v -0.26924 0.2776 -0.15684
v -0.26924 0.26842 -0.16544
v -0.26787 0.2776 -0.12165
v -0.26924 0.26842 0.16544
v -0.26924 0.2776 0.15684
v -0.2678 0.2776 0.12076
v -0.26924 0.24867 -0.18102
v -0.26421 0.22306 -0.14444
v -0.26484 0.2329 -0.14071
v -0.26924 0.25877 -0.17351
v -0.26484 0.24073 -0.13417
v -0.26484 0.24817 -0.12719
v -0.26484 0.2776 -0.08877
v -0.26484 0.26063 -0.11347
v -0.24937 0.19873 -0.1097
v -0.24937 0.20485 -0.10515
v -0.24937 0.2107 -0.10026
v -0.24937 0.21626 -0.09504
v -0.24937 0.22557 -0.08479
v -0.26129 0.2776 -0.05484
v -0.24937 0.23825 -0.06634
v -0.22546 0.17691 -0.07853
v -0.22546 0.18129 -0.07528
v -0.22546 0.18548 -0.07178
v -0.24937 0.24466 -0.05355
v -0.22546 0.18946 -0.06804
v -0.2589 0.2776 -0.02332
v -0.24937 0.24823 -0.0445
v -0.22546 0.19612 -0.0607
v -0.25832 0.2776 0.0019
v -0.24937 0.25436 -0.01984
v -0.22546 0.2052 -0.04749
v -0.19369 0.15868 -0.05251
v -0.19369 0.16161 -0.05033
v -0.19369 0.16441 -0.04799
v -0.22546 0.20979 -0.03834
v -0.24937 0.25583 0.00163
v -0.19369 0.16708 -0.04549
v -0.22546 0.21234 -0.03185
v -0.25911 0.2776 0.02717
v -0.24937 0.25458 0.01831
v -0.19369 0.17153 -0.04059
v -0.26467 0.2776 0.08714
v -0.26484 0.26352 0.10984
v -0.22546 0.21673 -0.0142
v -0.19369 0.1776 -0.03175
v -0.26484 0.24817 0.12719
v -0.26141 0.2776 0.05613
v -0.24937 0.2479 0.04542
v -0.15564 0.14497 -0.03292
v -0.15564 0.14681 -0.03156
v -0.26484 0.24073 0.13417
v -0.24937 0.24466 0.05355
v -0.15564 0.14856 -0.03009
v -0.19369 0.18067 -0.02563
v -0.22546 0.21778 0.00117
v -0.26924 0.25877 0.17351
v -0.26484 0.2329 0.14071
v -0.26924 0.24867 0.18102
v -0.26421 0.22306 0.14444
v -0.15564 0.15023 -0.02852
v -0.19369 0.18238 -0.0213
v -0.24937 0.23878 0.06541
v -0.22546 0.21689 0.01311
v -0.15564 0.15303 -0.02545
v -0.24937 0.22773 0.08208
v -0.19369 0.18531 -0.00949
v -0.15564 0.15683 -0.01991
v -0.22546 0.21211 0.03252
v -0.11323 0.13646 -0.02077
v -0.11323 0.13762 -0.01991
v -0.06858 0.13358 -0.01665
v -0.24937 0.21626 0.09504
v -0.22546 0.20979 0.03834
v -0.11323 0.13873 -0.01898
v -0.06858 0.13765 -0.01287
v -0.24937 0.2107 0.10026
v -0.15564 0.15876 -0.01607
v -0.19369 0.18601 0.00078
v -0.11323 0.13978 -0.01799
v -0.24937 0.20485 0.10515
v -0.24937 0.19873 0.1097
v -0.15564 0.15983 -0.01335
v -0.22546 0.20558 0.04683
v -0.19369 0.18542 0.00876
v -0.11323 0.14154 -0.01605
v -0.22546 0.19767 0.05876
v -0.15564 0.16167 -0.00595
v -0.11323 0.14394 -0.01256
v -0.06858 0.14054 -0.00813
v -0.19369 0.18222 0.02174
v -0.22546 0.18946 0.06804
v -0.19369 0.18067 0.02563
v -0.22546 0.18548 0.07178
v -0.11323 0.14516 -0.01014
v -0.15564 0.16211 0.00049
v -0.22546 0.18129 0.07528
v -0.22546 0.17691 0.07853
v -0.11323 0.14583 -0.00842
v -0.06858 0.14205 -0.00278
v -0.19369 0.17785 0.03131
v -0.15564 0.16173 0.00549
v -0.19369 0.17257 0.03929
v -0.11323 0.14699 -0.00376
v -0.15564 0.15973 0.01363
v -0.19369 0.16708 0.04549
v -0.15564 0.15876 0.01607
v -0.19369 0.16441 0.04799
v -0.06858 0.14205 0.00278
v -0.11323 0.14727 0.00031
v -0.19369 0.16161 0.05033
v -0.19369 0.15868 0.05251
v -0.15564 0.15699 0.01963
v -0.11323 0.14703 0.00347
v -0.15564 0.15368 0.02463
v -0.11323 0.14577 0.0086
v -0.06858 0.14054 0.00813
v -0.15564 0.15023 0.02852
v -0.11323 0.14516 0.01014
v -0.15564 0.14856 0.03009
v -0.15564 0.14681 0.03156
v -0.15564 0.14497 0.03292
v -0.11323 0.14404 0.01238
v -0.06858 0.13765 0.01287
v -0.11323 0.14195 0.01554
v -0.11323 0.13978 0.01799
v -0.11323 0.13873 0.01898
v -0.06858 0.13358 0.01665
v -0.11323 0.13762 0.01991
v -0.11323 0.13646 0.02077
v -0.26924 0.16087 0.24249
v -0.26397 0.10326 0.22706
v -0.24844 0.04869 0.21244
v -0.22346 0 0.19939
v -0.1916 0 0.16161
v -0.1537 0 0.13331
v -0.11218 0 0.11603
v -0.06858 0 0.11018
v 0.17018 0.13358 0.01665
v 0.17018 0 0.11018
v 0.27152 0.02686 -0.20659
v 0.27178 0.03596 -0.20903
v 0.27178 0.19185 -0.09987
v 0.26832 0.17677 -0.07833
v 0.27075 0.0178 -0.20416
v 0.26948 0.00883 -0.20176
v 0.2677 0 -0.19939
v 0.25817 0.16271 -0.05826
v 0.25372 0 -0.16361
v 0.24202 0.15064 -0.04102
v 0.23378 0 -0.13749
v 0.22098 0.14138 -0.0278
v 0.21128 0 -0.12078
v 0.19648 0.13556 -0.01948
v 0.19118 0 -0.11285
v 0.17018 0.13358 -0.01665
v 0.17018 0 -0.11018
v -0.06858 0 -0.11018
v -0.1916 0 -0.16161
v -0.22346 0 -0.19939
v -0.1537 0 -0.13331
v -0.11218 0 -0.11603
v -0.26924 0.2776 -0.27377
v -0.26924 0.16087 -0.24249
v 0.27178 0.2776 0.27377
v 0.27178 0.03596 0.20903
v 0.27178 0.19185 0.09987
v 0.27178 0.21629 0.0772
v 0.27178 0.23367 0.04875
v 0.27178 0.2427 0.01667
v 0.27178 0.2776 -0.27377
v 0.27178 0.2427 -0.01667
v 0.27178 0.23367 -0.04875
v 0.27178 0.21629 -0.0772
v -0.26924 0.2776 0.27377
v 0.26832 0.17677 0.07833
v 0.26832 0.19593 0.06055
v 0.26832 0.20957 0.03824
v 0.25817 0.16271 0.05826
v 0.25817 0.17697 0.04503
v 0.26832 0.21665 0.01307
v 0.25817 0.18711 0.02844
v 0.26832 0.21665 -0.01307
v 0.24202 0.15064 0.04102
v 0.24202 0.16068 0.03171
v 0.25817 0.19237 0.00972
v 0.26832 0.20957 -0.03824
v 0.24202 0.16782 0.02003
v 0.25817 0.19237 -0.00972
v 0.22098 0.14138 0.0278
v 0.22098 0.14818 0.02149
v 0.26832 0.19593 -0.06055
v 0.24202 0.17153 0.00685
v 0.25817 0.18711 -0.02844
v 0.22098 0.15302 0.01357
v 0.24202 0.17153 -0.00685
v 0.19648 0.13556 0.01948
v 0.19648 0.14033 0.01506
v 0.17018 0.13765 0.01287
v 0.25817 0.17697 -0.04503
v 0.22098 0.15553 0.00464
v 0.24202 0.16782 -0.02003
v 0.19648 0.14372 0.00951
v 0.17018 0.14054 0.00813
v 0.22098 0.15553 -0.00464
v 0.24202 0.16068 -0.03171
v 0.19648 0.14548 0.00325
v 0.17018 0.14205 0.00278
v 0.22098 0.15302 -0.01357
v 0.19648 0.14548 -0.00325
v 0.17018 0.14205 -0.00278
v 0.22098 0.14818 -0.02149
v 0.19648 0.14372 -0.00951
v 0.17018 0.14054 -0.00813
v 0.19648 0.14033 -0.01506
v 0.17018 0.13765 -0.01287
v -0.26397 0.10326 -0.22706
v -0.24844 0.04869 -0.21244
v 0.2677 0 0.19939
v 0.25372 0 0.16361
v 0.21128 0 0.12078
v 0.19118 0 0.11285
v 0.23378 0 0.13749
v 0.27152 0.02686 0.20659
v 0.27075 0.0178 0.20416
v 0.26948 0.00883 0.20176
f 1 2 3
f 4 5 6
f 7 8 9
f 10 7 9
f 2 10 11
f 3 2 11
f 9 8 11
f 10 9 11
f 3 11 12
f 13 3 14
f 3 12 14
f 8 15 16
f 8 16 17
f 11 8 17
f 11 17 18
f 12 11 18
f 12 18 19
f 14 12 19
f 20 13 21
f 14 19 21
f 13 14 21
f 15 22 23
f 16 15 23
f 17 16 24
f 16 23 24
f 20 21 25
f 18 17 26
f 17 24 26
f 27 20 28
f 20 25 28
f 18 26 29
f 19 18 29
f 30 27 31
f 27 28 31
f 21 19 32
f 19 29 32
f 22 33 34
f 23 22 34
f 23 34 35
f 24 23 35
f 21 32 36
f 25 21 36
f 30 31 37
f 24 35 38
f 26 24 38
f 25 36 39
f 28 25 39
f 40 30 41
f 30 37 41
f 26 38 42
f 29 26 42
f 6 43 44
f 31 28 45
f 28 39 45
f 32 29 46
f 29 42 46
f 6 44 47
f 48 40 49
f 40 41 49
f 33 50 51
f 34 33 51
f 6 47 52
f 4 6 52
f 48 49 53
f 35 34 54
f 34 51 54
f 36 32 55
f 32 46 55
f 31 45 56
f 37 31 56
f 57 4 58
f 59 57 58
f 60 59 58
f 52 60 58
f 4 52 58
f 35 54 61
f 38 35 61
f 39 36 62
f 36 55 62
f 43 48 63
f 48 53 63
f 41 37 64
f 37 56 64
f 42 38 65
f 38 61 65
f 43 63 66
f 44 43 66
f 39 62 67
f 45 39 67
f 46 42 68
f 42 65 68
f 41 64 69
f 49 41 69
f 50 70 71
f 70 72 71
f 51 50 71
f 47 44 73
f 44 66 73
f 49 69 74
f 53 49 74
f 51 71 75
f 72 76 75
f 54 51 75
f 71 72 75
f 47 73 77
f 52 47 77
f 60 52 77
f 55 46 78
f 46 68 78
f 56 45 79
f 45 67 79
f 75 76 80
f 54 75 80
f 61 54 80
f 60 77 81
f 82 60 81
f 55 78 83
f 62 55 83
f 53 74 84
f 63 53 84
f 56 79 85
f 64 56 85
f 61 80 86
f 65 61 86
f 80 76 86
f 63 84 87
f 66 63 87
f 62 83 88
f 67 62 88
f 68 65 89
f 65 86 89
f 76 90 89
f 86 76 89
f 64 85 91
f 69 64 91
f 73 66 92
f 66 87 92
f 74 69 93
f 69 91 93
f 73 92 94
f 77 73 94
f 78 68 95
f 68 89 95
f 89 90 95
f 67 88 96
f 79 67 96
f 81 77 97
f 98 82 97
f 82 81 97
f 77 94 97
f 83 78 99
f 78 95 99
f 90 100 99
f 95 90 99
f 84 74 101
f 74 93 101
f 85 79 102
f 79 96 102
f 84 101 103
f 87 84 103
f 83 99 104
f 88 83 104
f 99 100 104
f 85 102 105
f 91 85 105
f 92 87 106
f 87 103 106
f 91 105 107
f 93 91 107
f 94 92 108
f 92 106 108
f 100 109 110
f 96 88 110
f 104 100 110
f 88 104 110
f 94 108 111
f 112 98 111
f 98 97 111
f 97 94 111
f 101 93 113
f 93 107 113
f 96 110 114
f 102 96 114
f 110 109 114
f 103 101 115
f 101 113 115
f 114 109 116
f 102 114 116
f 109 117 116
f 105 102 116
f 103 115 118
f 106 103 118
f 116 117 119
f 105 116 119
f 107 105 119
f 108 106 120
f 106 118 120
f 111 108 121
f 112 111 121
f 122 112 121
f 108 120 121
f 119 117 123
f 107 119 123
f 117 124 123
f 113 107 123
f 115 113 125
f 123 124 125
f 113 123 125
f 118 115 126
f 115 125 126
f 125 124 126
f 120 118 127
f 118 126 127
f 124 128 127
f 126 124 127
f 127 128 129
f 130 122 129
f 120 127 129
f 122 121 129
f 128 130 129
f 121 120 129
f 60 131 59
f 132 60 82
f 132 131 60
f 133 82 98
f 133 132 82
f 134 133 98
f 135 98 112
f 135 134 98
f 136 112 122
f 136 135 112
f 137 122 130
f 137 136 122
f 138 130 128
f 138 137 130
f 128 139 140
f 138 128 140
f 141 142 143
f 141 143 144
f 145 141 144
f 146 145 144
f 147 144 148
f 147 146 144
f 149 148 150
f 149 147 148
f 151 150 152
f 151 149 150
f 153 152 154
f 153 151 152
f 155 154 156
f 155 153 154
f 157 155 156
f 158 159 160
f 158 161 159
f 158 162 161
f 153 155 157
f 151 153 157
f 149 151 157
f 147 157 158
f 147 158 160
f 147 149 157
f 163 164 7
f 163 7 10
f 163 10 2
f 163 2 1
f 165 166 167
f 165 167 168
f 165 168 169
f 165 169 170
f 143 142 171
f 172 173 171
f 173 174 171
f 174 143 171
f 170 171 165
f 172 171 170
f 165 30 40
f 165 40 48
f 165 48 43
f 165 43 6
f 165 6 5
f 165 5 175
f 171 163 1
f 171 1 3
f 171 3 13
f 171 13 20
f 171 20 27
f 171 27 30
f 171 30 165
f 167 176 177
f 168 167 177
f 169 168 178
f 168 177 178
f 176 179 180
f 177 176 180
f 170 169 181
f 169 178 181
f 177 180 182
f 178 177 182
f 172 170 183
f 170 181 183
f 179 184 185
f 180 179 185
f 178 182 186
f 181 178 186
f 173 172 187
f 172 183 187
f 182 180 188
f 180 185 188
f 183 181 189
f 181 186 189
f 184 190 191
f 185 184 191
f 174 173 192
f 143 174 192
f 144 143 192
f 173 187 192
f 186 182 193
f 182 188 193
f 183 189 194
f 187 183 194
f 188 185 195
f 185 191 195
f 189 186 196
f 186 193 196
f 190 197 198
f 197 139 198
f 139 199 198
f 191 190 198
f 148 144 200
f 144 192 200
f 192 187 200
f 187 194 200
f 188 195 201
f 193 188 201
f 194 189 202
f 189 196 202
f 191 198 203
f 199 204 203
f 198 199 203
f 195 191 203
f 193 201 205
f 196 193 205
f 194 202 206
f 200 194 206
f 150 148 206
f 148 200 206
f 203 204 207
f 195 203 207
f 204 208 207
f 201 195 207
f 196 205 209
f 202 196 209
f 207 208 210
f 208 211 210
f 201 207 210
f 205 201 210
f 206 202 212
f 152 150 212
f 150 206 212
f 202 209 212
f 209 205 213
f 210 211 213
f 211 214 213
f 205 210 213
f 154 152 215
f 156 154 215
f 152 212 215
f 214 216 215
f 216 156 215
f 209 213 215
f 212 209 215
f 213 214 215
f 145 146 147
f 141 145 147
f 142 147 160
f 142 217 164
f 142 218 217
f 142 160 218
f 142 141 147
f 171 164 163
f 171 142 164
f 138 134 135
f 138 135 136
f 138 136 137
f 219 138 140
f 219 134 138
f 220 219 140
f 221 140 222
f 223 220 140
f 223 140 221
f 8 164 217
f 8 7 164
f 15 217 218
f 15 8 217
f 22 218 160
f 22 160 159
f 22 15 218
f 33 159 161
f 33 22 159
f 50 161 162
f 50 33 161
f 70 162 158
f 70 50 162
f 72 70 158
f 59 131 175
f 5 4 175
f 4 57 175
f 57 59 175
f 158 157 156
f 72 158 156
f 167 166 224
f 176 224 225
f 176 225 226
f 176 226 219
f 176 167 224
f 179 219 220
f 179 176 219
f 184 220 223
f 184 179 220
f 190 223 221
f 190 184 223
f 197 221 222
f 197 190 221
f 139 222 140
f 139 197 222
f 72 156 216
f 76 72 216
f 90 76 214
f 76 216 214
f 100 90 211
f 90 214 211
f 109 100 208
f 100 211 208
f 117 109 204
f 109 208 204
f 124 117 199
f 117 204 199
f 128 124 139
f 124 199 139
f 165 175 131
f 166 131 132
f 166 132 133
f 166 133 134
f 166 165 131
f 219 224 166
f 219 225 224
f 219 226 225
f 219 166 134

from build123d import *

# Parameters (mm, degrees)
SKETCH_TL_CUTTING_R    = 1.4986
TL_CUTTING_DEPTH       = 75.9968
SKETCH_TDF_CUTTING_W   = 3.01719996
SKETCH_TDF_CUTTING_H   = 3.01719996
TDF_CUTTING_DEPTH      = 77.026345527
VW_VR_GRINDING_DEPTH   = 1.50859998
VW_VR_GRINDING_2_DEPTH = 1.50859998
ISA_GRINDING_DEPTH     = 1.50859998
SKETCH_PRE_FRX_BRX_W   = 1.21682002
SKETCH_PRE_FRX_BRX_H   = 0.83312
SKETCH_PRE_FRX_BRX_W_2 = 1.24935996
PRE_FRX_BRX_DEPTH      = 1.50859998
FA_BA_GRINDING_DEPTH   = 1.50859998
BR_EDM_R               = 0.20066
FR_EDM_R               = 0.1016
SKETCH_ENGRAVING_W     = 0.033186299
SKETCH_ENGRAVING_H     = 1.128593452
SKETCH_ENGRAVING_H_2   = 1.128593453
ENGRAVING_DEPTH        = 0.005


with BuildPart() as part:
    # sketch_TL_cutting → TL_cutting (new body)
    with BuildSketch(Plane(origin=(0, 0, 0), x_dir=(1, 0, 0), z_dir=(0, 1, 0))):
        with Locations(Location((0, 0, 0), (0, 0, 270))):
            Circle(SKETCH_TL_CUTTING_R)
    extrude(amount=TL_CUTTING_DEPTH)

    # sketch_TDF_cutting → TDF_cutting (cut, through all)
    with BuildSketch(Plane(origin=(0, 0, 0), x_dir=(1, 0, 0), z_dir=(0, 1, 0))):
        with Locations((-2.71001998, 0)):
            Rectangle(SKETCH_TDF_CUTTING_W, SKETCH_TDF_CUTTING_H)
    extrude(amount=TDF_CUTTING_DEPTH, mode=Mode.SUBTRACT)


with BuildPart() as body_2:
    # sketch_VW_VR_grinding → VW_VR_grinding (new, symmetric)
    with BuildSketch(Plane(origin=(0, 0, 0), x_dir=(0, 0, -1), z_dir=(1, 0, 0))):
        with BuildLine():
            Line((-1.49360001, -0.00999998), (-1.49360001, 0.822008914))
            ThreePointArc((-1.49360001, 0.822008914), (-1.493648337, 0.823115792), (-1.493792952, 0.824214246))
            Line((-1.493792952, 0.824214246), (-1.51859996, 0.964901782))
            Line((-1.51859996, 0.964901782), (-1.50859998, -0.00999998))
            Line((-1.50859998, -0.00999998), (-1.49360001, -0.00999998))
        make_face()
    extrude(amount=VW_VR_GRINDING_DEPTH, both=True)


with BuildPart() as body_3:
    # sketch_VW_VR_grinding → VW_VR_grinding 2 (new, symmetric)
    with BuildSketch(Plane(origin=(0, 0, 0), x_dir=(0, 0, -1), z_dir=(1, 0, 0))):
        with BuildLine():
            Line((1.49360001, -0.00999998), (1.49360001, 0.822008914))
            ThreePointArc((1.49360001, 0.822008914), (1.493648337, 0.823115792), (1.493792952, 0.824214246))
            Line((1.493792952, 0.824214246), (1.51859996, 0.964901782))
            Line((1.51859996, 0.964901782), (1.50859998, -0.00999998))
            Line((1.50859998, -0.00999998), (1.49360001, -0.00999998))
        make_face()
    extrude(amount=VW_VR_GRINDING_2_DEPTH, both=True)


    add(body_2.part)  # ISA_grinding merges body 2
    # sketch_ISA_grinding → ISA_grinding (add, symmetric)
    with BuildSketch(Plane(origin=(0, 0, 0), x_dir=(0, 0, -1), z_dir=(1, 0, 0))):
        Polygon((-0.19939, 0), (0.19939, 0), (1.50859998, 4.886038163), (1.50859998, -0.02999994), (-1.50859998, -0.02999994), (-1.50859998, 4.886038163), align=None)
    extrude(amount=ISA_GRINDING_DEPTH, both=True)

    # sketch_pre_FRX_BRX → pre_FRX_BRX (add, symmetric)
    with BuildSketch(Plane.XY):
        with Locations((0.89018999, 0.40656002)):
            Rectangle(SKETCH_PRE_FRX_BRX_W, SKETCH_PRE_FRX_BRX_H)
        with Locations((-0.89391998, 0.40656002)):
            Rectangle(SKETCH_PRE_FRX_BRX_W_2, SKETCH_PRE_FRX_BRX_H)
    extrude(amount=PRE_FRX_BRX_DEPTH, both=True)

    # sketch_FA_BA_grinding → FA_BA_grinding (add, symmetric)
    with BuildSketch(Plane.XY):
        Polygon((0.27178, -0.00999998), (0.27178, 0.83312), (1.6256, 10.466049838), (1.6256, -0.00999998), align=None)
        Polygon((-0.26924, -0.00999998), (-0.26924, 0.83312), (-1.32842, 8.369577303), (-1.32842, -0.00999998), align=None)
    extrude(amount=FA_BA_GRINDING_DEPTH, both=True)


with BuildPart() as part_1:
    add(part.part)

    # B1_fix: cut body 3
    add(body_3.part, mode=Mode.SUBTRACT)

    # V-Groove_EDM: sweep along a path in sketch_contour_V-Groove
    with BuildLine(Plane.XY) as v_groove_edm_path:
        Line((-1.20142, 0.14224), (1.4986, 0.14224))
    # sketch_section_V-Groove → V-Groove_EDM (sweep, cut)
    with BuildSketch(Plane(origin=(-1.20142, 0, -1.2954), x_dir=(0, 0, -1), z_dir=(1, 0, 0))):
        with BuildLine():
            Line((-1.27875483, 0.133575073), (-1.178222496, -0.00999998))
            Line((-1.178222496, -0.00999998), (-1.412577504, -0.00999998))
            Line((-1.412577504, -0.00999998), (-1.31204517, 0.133575073))
            ThreePointArc((-1.31204517, 0.133575073), (-1.2954, 0.14224), (-1.27875483, 0.133575073))
        make_face()
    sweep(path=v_groove_edm_path.line, mode=Mode.SUBTRACT)

    # BR_EDM
    br_edm_edges = [part_1.edges().sort_by_distance(p)[0] for p in [
        (-0.26924, 0.14224, 0),
        (-0.26924, 0.066787537, -0.063410306),
        (-0.26924, 0.066787537, 0.063410306),
    ]]
    fillet(br_edm_edges, radius=BR_EDM_R)

    # FR_EDM
    fr_edm_edges = [part_1.edges().sort_by_distance(p)[0] for p in [
        (0.27178, 0.066787537, -0.063410306),
        (0.27178, 0.066787537, 0.063410306),
        (0.27178, 0.14224, 0),
    ]]
    fillet(fr_edm_edges, radius=FR_EDM_R)

    # sketch_Engraving → Engraving (cut)
    # profile 1 of 14: a face of its own
    with BuildSketch(Plane.ZY.offset(1.20142)):
        Polygon((0.531688452, 45.269846756), (0.531688452, 44.551415224), (0.030264207, 44.92787231), (0.030264207, 44.765052028), (-0.034552784, 44.633862437), (-0.102740259, 44.56723057), (-0.296154161, 44.503450651), (-0.425528876, 44.503450651), (-0.618942778, 44.56723057), (-0.749354564, 44.69842016), (-0.81235668, 44.891834063), (-0.81235668, 45.083433089), (-0.749354564, 45.276846991), (-0.682722697, 45.345293734), (-0.555940662, 45.408295849), (-0.541940192, 45.382887589), (-0.665351744, 45.320663277), (-0.724724108, 45.262846521), (-0.785133544, 45.080062605), (-0.785133544, 44.895463814), (-0.724724108, 44.712420631), (-0.604164504, 44.592638831), (-0.42112132, 44.531451591), (-0.299524645, 44.531451591), (-0.116740729, 44.592638831), (-0.059701777, 44.652270463), (0.001485463, 44.772052263), (0.001485463, 44.985429798), (0.502909708, 44.60923198), (0.502909708, 45.269846756), align=None)
    # profile 2 of 14: a face of its own
    with BuildSketch(Plane.ZY.offset(1.20142)):
        Polygon((-0.79576353, 43.729743189), (-0.79576353, 43.758521933), (0.483723879, 43.758521933), (0.316755309, 43.923157091), (0.254530997, 44.049939126), (0.278902186, 44.064976668), (0.341904302, 43.940528044), (0.531688452, 43.74996609), (0.531688452, 43.729743189), align=None)
    # profile 3 of 14: a face of its own
    with BuildSketch(Plane.ZY.offset(1.20142)):
        Polygon((-0.79576353, 42.579837909), (-0.79576353, 42.608616653), (0.483723879, 42.608616653), (0.316755309, 42.773251811), (0.254530997, 42.900033846), (0.278902186, 42.915071388), (0.341904302, 42.790622765), (0.531688452, 42.60006081), (0.531688452, 42.579837909), align=None)
    # profile 4 of 14: a face of its own
    with BuildSketch(Plane.ZY.offset(1.20142)):
        Polygon((-0.786170615, 41.055549687), (-0.79576353, 41.079920876), (-0.367193584, 41.245333838), (-0.367193584, 41.893763019), (-0.79576353, 42.059175981), (-0.786170615, 42.08354717), (0.531688452, 41.578752441), (0.531688452, 41.559566612), align=None)
        Polygon((-0.340748251, 41.255704557), (0.478538519, 41.569159527), (-0.340748251, 41.883133033), align=None, mode=Mode.SUBTRACT)
    # profile 5 of 14: a face of its own
    with BuildSketch(Plane.ZY.offset(1.20142)):
        with Locations((-0.231596438, 40.285083075)):
            Rectangle(SKETCH_ENGRAVING_W, SKETCH_ENGRAVING_H)
    # profile 6 of 14: a face of its own
    with BuildSketch(Plane.ZY.offset(1.20142)):
        Polygon((0.515095302, 38.490248732), (-0.79576353, 38.988821029), (-0.79576353, 39.018636845), (0.521058466, 39.518246214), (0.531688452, 39.493875025), (-0.756354799, 39.003858571), (0.525466021, 38.514619921), align=None)
    # profile 7 of 14: a face of its own
    with BuildSketch(Plane.ZY.offset(1.20142)):
        Polygon((-0.786170615, 38.108295165), (0.502909708, 37.49227448), (0.502909708, 38.347080961), (0.531688452, 38.347080961), (0.531688452, 37.44508771), (-0.79576353, 38.083664709), align=None)
    # profile 8 of 14: a face of its own
    with BuildSketch(Plane.ZY.offset(1.20142)):
        Polygon((-0.554125786, 36.366740389), (-0.749354564, 36.498189247), (-0.81235668, 36.693158757), (-0.81235668, 36.82279274), (-0.749354564, 37.01776225), (-0.554125786, 37.148174036), (-0.237559601, 37.211176152), (-0.044923503, 37.211176152), (0.271901951, 37.148174036), (0.466871461, 37.01776225), (0.531688452, 36.82279274), (0.531688452, 36.693158757), (0.466871461, 36.498189247), (0.271901951, 36.366740389), (-0.044923503, 36.304775345), (-0.237559601, 36.304775345), align=None)
        Polygon((-0.539347512, 36.395778401), (-0.22874449, 36.332776285), (-0.044923503, 36.332776285), (0.26567952, 36.395778401), (0.446907827, 36.515560201), (0.507057995, 36.696788509), (0.507057995, 36.818385184), (0.446907827, 36.999613492), (0.26567952, 37.120173096), (-0.044923503, 37.182397408), (-0.22874449, 37.182397408), (-0.539347512, 37.120173096), (-0.72057582, 36.999613492), (-0.780985256, 36.818385184), (-0.780985256, 36.696788509), (-0.72057582, 36.515560201), align=None, mode=Mode.SUBTRACT)
    # profile 9 of 14: a face of its own
    with BuildSketch(Plane.ZY.offset(1.20142)):
        with Locations((-0.231596438, 35.419971561)):
            Rectangle(SKETCH_ENGRAVING_W, SKETCH_ENGRAVING_H_2)
    # profile 10 of 14: a face of its own
    with BuildSketch(Plane.ZY.offset(1.20142)):
        Polygon((-0.541940192, 34.502759279), (-0.665351744, 34.440534968), (-0.724724108, 34.382718211), (-0.785133544, 34.199934296), (-0.785133544, 34.015335505), (-0.724724108, 33.832292321), (-0.604164504, 33.712510521), (-0.42112132, 33.651323281), (-0.299524645, 33.651323281), (-0.116740729, 33.712510521), (0.003041071, 33.832292321), (0.064487579, 34.015335505), (0.064487579, 34.199934296), (0.003041071, 34.382718211), (-0.086924913, 34.470350784), (0.531688452, 34.402941113), (0.531688452, 33.762289971), (0.502909708, 33.762289971), (0.502909708, 34.377532852), (-0.007329648, 34.434312537), (0.028449332, 34.396718682), (0.092488519, 34.203304779), (0.092488519, 34.011705753), (0.028449332, 33.818291851), (-0.102740259, 33.687102261), (-0.296154161, 33.623322341), (-0.425528876, 33.623322341), (-0.618942778, 33.687102261), (-0.749354564, 33.818291851), (-0.81235668, 34.011705753), (-0.81235668, 34.203304779), (-0.749354564, 34.396718682), (-0.682722697, 34.465165424), (-0.555940662, 34.52816754), align=None)
    # profile 11 of 14: a face of its own
    with BuildSketch(Plane.ZY.offset(1.20142)):
        Polygon((-0.554125786, 32.535382105), (-0.749354564, 32.666830964), (-0.81235668, 32.861800473), (-0.81235668, 32.991434456), (-0.749354564, 33.186403966), (-0.554125786, 33.316815753), (-0.237559601, 33.379817868), (-0.044923503, 33.379817868), (0.271901951, 33.316815753), (0.466871461, 33.186403966), (0.531688452, 32.991434456), (0.531688452, 32.861800473), (0.466871461, 32.666830964), (0.271901951, 32.535382105), (-0.044923503, 32.473417061), (-0.237559601, 32.473417061), align=None)
        Polygon((-0.539347512, 32.564420117), (-0.22874449, 32.501418002), (-0.044923503, 32.501418002), (0.26567952, 32.564420117), (0.446907827, 32.684201917), (0.507057995, 32.865430225), (0.507057995, 32.987026901), (0.446907827, 33.168255208), (0.26567952, 33.288814812), (-0.044923503, 33.351039124), (-0.22874449, 33.351039124), (-0.539347512, 33.288814812), (-0.72057582, 33.168255208), (-0.780985256, 32.987026901), (-0.780985256, 32.865430225), (-0.72057582, 32.684201917), align=None, mode=Mode.SUBTRACT)
    # profile 12 of 14: a face of its own
    with BuildSketch(Plane.ZY.offset(1.20142)):
        Polygon((-0.554125786, 31.385476826), (-0.749354564, 31.516925684), (-0.81235668, 31.711895194), (-0.81235668, 31.841529177), (-0.749354564, 32.036498686), (-0.554125786, 32.166910473), (-0.237559601, 32.229912589), (-0.044923503, 32.229912589), (0.271901951, 32.166910473), (0.466871461, 32.036498686), (0.531688452, 31.841529177), (0.531688452, 31.711895194), (0.466871461, 31.516925684), (0.271901951, 31.385476826), (-0.044923503, 31.323511782), (-0.237559601, 31.323511782), align=None)
        Polygon((-0.539347512, 31.414514838), (-0.22874449, 31.351512722), (-0.044923503, 31.351512722), (0.26567952, 31.414514838), (0.446907827, 31.534296638), (0.507057995, 31.715524945), (0.507057995, 31.837121621), (0.446907827, 32.018349929), (0.26567952, 32.138909533), (-0.044923503, 32.201133844), (-0.22874449, 32.201133844), (-0.539347512, 32.138909533), (-0.72057582, 32.018349929), (-0.780985256, 31.837121621), (-0.780985256, 31.715524945), (-0.72057582, 31.534296638), align=None, mode=Mode.SUBTRACT)
    # profile 13 of 14: a face of its own
    with BuildSketch(Plane.ZY.offset(1.20142)):
        with Locations((-0.231596438, 30.438707997)):
            Rectangle(SKETCH_ENGRAVING_W, SKETCH_ENGRAVING_H_2)
    # profile 14 of 14: a face of its own
    with BuildSketch(Plane.ZY.offset(1.20142)):
        Polygon((-0.79576353, 29.018256595), (-0.79576353, 29.04703534), (0.483723879, 29.04703534), (0.316755309, 29.211670497), (0.254530997, 29.338452532), (0.278902186, 29.353490074), (0.341904302, 29.229041451), (0.531688452, 29.038479497), (0.531688452, 29.018256595), align=None)
    extrude(amount=-ENGRAVING_DEPTH, mode=Mode.SUBTRACT)

    # SurfaceCut1
    split(bisect_by=Plane(origin=(0, 0.277595628, 0), x_dir=(1, 0, 0), z_dir=(0, 1, 0)), keep=Keep.BOTTOM)


solid = part_1.part
